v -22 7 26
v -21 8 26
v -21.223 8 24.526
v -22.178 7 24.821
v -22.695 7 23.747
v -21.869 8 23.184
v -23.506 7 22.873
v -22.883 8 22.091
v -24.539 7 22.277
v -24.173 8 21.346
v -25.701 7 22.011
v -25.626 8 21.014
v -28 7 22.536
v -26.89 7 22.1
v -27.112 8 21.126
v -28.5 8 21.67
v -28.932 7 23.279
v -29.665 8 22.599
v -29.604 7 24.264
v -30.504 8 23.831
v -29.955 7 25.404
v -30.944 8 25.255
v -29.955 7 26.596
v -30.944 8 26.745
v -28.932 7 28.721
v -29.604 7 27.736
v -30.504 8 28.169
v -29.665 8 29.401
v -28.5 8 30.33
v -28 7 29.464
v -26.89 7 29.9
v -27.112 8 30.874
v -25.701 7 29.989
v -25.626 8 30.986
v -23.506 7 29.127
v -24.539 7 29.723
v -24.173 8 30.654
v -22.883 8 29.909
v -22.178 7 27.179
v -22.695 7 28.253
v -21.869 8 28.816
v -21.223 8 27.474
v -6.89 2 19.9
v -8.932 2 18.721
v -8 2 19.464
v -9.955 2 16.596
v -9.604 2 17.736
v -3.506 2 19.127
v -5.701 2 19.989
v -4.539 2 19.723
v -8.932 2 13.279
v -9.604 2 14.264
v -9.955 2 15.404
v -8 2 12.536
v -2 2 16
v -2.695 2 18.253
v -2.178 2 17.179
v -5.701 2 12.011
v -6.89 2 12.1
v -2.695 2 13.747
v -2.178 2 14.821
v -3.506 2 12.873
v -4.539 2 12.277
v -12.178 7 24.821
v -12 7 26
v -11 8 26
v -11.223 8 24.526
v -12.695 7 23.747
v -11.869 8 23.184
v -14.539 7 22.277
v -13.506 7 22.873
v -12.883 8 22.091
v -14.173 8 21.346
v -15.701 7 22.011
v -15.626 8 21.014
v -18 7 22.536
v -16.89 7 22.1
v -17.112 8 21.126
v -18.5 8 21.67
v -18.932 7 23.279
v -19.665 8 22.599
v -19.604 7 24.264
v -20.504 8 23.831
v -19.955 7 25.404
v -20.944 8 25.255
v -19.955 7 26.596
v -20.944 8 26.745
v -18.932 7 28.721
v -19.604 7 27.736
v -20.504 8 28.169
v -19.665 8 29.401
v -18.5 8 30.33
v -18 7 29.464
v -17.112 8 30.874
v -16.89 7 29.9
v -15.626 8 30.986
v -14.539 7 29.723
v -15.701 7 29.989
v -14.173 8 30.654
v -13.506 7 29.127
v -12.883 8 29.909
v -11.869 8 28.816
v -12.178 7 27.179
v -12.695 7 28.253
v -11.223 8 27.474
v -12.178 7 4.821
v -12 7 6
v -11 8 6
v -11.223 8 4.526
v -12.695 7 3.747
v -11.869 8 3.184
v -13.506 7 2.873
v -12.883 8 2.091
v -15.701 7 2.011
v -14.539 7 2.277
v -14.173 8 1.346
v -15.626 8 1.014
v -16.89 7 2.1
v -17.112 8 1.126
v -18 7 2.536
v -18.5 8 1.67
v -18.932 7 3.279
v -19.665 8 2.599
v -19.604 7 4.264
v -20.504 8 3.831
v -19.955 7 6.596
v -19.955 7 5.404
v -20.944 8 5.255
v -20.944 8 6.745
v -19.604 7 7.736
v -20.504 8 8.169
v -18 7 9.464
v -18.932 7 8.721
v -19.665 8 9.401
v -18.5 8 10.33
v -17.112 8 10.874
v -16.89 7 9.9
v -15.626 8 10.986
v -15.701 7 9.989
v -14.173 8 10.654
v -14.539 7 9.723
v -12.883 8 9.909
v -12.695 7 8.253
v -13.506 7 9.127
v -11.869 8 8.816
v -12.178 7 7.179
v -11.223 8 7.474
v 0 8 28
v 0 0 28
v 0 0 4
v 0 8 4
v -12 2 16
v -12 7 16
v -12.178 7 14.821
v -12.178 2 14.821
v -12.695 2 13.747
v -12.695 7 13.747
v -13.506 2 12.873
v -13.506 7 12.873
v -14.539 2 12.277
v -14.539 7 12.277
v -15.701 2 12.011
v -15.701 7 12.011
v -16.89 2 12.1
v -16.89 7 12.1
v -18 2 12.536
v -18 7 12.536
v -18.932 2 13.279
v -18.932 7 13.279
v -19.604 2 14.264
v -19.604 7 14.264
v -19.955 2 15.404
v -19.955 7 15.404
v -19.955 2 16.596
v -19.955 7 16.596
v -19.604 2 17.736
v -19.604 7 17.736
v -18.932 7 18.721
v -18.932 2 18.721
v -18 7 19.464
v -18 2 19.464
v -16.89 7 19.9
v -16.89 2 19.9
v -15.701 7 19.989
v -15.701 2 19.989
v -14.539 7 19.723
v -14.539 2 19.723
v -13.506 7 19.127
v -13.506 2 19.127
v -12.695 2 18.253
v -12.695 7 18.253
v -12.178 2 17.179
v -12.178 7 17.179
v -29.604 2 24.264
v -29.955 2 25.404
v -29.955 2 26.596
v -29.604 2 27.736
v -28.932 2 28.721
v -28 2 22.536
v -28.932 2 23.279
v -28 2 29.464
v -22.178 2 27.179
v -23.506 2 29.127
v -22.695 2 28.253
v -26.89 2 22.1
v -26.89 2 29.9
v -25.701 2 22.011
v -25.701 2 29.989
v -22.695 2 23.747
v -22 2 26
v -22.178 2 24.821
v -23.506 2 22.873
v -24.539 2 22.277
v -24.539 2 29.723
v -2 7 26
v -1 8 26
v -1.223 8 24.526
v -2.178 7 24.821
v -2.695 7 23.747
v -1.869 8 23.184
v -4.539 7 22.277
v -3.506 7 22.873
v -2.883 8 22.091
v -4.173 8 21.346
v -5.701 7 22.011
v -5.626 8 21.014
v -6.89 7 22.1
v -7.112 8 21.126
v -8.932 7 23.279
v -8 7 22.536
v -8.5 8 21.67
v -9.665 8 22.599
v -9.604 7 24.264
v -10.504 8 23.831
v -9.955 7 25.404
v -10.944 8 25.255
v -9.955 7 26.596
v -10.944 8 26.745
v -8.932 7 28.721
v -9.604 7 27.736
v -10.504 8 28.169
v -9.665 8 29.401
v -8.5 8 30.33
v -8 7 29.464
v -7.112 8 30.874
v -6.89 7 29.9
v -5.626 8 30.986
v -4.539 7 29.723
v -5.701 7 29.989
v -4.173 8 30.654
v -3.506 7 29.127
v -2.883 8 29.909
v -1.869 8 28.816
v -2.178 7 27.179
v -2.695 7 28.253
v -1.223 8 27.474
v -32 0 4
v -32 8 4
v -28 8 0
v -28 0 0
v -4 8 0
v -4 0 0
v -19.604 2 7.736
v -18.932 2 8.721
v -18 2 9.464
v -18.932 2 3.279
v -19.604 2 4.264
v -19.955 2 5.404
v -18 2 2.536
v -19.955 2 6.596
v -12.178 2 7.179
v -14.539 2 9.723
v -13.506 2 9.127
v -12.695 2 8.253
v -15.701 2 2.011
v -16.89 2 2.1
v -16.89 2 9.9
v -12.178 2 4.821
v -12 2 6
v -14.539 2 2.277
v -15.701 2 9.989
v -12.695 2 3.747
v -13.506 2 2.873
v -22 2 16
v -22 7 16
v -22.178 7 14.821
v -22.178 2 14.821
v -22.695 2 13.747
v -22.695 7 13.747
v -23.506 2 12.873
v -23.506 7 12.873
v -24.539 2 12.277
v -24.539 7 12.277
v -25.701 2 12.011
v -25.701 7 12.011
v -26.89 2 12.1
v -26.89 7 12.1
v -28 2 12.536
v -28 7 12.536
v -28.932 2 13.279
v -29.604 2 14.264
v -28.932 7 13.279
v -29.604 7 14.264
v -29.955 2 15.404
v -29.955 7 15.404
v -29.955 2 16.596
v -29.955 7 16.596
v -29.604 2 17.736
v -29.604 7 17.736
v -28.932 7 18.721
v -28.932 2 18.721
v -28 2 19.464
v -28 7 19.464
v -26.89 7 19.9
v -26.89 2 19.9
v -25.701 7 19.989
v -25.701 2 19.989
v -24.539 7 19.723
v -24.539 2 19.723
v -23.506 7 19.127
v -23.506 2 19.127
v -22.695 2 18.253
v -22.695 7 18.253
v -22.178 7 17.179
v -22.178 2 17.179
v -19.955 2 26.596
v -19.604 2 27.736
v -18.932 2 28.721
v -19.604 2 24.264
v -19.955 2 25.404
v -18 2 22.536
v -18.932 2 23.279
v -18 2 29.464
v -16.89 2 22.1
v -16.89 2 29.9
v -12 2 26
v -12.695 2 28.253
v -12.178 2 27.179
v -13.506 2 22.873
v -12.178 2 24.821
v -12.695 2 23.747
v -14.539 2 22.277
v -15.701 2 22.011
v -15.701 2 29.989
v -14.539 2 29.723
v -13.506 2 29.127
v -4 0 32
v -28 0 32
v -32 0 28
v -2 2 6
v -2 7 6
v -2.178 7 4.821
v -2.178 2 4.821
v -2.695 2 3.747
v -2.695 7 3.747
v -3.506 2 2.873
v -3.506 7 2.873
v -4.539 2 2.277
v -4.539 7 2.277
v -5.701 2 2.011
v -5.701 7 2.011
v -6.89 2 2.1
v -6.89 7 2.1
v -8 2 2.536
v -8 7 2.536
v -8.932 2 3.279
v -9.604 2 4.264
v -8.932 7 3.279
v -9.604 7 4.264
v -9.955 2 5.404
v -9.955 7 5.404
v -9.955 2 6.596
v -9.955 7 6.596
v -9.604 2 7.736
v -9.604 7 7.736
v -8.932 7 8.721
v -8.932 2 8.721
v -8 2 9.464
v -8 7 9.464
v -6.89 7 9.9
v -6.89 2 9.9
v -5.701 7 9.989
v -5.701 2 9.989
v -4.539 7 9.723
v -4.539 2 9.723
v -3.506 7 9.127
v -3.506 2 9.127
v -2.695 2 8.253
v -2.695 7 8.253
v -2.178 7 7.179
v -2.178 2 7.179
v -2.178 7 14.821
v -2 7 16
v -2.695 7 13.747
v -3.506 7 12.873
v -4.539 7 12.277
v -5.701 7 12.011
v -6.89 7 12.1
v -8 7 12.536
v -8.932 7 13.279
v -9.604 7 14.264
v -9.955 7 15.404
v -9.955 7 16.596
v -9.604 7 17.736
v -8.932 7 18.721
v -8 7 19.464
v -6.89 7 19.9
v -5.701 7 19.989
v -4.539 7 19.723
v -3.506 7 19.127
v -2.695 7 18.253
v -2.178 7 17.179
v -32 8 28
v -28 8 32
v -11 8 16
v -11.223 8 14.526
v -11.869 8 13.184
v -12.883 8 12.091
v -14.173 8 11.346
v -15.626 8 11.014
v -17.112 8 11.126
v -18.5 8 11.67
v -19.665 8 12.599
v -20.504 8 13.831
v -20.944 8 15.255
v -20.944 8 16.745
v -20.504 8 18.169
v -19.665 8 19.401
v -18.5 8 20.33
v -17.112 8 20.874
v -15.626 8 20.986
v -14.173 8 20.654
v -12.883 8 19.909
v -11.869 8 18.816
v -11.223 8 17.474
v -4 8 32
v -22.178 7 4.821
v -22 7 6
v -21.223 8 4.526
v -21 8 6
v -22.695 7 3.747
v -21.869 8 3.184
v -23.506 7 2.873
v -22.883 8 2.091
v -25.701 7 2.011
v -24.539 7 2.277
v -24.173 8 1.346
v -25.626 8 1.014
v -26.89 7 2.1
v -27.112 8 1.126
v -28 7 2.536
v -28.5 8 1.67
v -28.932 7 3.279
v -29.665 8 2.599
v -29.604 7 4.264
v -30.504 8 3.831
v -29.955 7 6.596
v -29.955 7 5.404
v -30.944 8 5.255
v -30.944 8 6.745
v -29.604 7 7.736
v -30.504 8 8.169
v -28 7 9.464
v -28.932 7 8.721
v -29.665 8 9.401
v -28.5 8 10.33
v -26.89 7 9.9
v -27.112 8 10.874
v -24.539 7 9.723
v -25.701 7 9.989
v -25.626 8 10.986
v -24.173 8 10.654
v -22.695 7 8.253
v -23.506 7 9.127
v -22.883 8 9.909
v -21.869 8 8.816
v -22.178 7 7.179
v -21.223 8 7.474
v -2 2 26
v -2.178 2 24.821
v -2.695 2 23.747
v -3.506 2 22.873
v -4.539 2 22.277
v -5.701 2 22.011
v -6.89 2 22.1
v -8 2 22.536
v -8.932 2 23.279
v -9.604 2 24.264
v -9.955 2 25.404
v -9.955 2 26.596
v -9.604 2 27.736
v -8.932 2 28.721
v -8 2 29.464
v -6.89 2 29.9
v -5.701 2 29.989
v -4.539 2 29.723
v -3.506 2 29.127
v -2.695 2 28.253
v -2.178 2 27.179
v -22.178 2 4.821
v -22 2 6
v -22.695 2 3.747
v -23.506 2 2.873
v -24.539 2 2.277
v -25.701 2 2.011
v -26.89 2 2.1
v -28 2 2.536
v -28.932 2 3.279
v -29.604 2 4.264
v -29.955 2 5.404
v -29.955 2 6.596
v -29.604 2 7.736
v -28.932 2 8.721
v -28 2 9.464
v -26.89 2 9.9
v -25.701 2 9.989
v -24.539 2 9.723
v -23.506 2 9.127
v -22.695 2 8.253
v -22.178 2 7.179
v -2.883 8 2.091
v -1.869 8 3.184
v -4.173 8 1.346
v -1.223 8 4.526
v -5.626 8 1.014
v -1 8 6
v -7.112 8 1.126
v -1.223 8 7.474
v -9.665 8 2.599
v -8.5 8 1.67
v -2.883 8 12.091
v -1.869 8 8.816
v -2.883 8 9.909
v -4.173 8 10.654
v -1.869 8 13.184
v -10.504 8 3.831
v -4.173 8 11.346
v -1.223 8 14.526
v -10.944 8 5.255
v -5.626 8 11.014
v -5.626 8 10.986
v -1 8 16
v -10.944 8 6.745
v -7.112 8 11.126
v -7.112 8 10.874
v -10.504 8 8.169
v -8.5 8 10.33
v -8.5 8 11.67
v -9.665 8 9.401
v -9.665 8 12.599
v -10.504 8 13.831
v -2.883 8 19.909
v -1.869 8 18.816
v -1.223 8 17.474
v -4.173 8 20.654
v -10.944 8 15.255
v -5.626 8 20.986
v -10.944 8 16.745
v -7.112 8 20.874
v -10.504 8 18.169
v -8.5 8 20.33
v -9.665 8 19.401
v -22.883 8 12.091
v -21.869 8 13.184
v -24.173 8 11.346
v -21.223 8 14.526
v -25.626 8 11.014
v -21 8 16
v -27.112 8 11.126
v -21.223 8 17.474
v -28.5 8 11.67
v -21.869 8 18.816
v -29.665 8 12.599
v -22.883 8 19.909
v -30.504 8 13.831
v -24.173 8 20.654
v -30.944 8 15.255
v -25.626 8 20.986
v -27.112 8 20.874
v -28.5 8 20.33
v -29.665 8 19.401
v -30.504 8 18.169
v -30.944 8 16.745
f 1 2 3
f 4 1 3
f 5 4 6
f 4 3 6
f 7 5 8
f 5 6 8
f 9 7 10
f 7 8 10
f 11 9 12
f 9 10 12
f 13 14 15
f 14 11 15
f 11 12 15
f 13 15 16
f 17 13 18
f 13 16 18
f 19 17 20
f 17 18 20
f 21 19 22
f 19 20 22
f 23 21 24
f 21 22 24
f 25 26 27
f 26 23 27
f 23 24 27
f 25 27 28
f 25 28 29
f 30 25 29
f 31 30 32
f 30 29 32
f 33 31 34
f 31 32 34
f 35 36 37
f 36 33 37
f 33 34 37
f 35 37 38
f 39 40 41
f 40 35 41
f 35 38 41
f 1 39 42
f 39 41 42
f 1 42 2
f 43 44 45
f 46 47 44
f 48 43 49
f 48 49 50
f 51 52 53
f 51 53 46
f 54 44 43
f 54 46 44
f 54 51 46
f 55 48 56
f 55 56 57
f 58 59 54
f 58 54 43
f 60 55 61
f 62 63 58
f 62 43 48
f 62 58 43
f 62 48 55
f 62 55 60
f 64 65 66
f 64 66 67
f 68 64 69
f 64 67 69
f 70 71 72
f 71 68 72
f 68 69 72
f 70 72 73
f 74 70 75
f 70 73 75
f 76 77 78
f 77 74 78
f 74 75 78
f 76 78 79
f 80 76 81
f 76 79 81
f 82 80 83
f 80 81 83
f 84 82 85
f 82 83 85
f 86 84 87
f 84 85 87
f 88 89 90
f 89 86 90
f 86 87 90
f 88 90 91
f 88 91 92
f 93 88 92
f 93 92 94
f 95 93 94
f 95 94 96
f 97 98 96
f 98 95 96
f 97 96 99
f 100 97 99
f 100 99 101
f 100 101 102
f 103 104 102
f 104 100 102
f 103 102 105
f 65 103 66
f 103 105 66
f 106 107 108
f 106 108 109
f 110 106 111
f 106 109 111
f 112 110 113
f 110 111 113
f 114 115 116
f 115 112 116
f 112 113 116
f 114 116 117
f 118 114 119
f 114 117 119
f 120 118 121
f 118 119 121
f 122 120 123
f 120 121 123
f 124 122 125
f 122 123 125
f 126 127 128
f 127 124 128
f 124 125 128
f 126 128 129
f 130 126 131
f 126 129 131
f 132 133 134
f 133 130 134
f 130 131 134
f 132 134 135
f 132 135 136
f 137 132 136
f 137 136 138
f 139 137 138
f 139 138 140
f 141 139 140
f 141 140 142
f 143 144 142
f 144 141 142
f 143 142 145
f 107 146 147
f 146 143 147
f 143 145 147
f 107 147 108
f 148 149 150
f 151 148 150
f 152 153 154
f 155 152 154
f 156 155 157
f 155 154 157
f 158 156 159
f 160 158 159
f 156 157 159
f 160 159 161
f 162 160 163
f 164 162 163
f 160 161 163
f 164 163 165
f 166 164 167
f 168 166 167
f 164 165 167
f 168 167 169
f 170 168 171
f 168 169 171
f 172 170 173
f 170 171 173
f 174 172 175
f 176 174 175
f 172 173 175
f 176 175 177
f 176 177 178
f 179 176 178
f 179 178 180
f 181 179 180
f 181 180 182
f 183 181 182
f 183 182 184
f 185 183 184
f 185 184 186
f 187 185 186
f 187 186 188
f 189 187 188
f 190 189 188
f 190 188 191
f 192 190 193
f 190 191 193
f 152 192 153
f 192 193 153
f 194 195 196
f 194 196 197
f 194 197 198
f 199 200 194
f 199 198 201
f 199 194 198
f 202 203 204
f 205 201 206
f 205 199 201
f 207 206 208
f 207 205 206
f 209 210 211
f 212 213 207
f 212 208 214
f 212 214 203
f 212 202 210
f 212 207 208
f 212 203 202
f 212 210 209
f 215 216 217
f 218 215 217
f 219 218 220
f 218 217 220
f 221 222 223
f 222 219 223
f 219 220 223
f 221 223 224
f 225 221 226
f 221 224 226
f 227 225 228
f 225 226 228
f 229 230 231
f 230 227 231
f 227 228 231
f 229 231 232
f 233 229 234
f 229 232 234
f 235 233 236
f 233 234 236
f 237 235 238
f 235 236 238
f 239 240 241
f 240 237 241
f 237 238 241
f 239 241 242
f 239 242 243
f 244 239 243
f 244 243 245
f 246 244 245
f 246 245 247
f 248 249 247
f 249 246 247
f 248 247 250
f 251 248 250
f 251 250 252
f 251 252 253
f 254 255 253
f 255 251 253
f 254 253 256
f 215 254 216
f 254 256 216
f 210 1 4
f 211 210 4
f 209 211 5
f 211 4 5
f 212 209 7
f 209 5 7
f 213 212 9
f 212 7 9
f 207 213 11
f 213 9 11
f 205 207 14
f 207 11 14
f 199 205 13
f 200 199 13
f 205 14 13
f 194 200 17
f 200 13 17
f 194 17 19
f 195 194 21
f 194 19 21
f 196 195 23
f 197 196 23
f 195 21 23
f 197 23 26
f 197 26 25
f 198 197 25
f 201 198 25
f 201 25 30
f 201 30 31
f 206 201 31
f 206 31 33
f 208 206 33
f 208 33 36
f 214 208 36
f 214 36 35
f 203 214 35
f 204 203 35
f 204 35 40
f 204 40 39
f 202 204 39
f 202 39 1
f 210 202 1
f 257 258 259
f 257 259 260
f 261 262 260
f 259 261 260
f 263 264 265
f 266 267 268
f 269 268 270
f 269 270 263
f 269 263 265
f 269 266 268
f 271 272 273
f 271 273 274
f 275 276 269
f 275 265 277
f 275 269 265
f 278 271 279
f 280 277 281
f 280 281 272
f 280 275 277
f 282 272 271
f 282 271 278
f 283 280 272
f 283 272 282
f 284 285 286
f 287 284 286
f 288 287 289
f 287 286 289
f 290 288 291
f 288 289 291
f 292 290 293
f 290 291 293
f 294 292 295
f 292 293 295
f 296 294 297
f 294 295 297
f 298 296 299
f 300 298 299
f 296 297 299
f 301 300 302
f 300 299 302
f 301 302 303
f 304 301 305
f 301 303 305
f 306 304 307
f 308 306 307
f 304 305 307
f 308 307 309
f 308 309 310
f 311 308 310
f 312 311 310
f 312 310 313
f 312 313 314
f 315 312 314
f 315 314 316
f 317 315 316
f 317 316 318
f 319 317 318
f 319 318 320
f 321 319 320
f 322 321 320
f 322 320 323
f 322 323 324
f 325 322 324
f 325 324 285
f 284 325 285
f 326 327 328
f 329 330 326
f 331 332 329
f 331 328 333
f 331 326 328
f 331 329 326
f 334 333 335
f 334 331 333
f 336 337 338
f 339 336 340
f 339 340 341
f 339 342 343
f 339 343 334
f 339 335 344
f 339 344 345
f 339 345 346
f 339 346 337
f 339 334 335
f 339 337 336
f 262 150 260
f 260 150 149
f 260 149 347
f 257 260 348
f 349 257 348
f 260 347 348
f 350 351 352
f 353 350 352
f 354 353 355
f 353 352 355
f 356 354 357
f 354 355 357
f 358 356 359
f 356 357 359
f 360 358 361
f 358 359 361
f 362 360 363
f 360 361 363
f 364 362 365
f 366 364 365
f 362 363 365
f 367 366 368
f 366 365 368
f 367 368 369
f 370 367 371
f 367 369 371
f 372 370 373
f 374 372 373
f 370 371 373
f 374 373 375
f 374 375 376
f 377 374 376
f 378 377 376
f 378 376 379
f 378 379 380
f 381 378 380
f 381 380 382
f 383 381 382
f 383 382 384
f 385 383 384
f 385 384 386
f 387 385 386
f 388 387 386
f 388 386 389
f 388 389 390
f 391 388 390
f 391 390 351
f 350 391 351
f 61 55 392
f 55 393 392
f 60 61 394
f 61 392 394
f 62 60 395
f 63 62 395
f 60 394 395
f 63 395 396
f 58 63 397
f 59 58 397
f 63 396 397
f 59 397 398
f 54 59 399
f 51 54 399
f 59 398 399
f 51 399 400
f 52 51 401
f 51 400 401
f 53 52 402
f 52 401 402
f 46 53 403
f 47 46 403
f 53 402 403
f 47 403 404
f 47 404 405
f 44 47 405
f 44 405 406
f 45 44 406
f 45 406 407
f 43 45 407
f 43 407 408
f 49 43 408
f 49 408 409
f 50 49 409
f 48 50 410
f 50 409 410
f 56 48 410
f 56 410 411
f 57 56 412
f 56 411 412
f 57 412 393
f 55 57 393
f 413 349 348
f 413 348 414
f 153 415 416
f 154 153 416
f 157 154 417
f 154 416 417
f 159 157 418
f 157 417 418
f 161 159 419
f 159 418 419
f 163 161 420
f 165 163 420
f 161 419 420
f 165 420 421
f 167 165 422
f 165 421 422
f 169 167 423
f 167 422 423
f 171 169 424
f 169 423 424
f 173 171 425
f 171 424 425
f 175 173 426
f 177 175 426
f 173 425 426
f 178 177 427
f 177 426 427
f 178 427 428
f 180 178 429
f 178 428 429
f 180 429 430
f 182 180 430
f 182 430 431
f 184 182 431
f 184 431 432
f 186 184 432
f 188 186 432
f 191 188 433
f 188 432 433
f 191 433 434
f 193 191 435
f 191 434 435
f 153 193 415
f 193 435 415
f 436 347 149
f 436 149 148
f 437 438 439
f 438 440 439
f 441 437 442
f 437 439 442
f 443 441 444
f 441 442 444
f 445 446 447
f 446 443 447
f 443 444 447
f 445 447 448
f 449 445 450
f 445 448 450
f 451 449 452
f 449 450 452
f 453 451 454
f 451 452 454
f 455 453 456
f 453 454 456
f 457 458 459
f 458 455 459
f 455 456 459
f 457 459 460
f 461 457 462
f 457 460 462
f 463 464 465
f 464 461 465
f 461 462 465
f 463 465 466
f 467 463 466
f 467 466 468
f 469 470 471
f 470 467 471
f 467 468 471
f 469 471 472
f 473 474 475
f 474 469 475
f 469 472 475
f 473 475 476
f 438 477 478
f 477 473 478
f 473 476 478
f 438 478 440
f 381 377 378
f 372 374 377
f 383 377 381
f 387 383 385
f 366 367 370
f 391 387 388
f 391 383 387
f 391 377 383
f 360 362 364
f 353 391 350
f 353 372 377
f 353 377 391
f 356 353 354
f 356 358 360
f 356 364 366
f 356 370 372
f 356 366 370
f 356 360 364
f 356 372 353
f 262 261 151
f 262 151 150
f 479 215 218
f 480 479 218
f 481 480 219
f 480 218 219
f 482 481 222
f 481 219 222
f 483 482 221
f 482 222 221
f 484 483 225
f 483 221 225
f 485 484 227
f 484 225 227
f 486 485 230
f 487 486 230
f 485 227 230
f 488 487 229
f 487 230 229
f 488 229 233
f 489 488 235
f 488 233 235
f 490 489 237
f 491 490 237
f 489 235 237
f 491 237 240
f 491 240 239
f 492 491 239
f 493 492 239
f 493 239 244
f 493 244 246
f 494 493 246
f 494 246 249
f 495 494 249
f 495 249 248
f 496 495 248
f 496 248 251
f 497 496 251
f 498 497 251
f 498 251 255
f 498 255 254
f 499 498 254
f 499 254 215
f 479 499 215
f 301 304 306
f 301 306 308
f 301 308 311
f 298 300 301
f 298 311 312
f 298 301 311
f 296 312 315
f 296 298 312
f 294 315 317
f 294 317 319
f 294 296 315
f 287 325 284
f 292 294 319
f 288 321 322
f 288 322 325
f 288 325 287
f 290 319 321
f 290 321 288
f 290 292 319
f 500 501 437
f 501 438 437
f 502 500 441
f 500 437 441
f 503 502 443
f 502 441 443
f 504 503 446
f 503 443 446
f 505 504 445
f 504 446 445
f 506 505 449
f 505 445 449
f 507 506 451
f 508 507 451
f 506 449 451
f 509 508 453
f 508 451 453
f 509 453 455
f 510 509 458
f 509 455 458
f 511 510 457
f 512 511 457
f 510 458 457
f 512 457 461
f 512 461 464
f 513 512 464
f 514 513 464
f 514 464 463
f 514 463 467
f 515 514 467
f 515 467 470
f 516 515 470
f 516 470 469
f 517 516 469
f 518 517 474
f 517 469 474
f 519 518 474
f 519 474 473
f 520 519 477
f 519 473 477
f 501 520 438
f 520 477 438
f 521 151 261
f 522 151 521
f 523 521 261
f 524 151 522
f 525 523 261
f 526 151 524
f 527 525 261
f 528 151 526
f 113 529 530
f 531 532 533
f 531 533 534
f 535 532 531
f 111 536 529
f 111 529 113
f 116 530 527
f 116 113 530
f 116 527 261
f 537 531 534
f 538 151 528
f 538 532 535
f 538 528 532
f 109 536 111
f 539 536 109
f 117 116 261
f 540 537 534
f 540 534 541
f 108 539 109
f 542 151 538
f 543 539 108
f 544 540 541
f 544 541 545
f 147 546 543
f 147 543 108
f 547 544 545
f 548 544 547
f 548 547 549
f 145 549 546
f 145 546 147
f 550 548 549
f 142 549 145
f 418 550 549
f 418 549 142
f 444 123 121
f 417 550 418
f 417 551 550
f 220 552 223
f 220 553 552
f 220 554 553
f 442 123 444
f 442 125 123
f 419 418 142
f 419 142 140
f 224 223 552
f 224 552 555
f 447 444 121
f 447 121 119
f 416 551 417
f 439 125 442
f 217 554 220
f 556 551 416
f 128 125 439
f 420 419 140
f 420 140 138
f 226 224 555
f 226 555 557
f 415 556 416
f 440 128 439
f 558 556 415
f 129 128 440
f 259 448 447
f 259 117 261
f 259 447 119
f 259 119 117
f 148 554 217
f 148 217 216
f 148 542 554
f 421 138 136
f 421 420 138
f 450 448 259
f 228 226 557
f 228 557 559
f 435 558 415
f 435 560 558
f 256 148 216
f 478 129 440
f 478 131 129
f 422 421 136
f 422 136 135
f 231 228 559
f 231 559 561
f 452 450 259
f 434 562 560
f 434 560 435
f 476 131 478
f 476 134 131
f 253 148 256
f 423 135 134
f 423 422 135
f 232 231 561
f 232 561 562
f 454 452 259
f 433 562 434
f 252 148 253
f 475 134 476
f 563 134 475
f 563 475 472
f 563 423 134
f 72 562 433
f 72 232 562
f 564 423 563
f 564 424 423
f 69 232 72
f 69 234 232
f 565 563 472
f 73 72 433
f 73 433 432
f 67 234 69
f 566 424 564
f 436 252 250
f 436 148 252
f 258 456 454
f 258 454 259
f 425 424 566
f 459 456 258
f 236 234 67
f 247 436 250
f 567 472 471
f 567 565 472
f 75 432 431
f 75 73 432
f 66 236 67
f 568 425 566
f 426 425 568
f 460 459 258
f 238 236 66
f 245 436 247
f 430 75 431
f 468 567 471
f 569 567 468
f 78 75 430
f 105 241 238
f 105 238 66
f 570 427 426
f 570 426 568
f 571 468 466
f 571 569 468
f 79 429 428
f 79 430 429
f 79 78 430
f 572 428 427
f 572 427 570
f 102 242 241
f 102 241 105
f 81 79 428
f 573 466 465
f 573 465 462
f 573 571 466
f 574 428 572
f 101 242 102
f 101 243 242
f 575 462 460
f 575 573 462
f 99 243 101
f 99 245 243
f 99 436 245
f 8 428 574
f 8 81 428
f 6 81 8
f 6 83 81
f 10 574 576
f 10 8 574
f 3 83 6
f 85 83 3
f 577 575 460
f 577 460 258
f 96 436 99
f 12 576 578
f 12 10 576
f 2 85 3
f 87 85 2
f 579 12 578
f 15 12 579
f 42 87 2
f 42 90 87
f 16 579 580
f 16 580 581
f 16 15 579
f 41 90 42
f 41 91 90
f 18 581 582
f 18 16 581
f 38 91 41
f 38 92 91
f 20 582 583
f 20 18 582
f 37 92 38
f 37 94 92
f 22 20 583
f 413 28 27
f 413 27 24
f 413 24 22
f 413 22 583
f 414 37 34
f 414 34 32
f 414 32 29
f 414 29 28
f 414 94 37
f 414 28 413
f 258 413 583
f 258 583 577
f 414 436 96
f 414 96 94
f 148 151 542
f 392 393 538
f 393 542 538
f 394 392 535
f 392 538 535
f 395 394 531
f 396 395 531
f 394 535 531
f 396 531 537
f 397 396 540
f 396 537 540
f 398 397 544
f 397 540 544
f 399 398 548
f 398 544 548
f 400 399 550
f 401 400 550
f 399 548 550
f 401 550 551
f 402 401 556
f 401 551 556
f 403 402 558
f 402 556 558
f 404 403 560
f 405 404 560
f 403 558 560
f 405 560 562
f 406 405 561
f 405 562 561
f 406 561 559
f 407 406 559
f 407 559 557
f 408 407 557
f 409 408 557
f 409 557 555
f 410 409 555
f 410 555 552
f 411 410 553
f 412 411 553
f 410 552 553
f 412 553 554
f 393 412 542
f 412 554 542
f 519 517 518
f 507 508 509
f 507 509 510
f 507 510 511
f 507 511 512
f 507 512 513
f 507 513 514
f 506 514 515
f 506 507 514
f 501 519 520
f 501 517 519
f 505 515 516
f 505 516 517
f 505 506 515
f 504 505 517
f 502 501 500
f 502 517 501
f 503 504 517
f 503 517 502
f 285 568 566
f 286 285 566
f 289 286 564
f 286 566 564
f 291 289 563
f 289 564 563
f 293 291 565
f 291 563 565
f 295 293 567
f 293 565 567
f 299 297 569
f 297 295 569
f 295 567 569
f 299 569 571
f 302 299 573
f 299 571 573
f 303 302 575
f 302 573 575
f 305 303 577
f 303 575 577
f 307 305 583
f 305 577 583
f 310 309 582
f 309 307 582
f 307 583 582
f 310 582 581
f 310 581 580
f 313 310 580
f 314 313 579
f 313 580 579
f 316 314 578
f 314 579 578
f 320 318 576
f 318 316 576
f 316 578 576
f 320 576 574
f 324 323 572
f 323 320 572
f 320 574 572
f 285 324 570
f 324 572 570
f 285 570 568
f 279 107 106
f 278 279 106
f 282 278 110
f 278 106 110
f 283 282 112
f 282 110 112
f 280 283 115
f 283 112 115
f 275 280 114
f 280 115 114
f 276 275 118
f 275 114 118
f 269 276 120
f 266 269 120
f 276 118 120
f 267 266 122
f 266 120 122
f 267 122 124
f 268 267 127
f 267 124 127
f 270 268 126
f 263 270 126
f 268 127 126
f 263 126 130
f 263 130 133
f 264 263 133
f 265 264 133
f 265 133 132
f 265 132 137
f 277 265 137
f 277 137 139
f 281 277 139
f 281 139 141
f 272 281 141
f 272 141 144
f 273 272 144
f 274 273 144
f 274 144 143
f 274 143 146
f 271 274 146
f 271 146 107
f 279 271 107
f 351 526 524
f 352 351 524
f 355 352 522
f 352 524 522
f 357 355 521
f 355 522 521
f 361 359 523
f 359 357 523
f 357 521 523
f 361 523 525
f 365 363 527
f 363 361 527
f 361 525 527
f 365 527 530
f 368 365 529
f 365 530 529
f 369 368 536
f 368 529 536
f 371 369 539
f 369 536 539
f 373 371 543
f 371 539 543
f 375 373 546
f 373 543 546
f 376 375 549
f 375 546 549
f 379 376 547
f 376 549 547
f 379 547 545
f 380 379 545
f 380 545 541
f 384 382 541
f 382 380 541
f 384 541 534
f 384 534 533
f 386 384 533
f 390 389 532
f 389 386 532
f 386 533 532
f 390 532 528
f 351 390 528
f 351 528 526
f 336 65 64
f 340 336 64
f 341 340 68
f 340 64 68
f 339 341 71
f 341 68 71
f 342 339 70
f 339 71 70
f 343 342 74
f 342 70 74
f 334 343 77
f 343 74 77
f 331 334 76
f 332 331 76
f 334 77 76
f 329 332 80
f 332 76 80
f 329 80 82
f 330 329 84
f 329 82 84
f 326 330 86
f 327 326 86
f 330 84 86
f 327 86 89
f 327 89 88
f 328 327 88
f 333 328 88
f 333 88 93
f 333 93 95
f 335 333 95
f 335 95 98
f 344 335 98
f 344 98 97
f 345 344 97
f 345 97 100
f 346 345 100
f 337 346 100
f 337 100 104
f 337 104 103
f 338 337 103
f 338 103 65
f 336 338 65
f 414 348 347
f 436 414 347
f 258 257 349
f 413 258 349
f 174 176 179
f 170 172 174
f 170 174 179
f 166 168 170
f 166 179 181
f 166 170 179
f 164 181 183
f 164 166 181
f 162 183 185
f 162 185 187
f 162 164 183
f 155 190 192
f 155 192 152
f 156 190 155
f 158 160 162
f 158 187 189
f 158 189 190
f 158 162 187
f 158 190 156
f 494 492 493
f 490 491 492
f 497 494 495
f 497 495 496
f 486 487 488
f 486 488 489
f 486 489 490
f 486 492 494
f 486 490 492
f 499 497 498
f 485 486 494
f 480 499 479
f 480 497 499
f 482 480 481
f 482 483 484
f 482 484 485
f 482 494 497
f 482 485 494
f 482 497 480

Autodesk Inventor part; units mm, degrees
ref_plane "YZ Plane" through (0, 0, 0) normal (1, 0, 0) x (0, 1, 0)
ref_plane "XZ Plane" through (0, 0, 0) normal (0, 1, 0) x (-1, 0, 0)
ref_plane "XY Plane" through (0, 0, 0) normal (0, 0, 1) x (1, 0, 0)
sketch "Esquisse1" plane through (0, 0, 0) normal (0, 1, 0) x (-1, 0, 0)
  line L0 (0, 0) -> (32, 0)
  line L1 (32, 0) -> (32, 32)
  line L2 (32, 32) -> (0, 32)
  line L3 (0, 32) -> (0, 0)
  dimension "d0" = 32
  dimension "d1" = 32
extrude "Extrusion1" add sketch "Esquisse1" along normal blind 8
sketch "Esquisse2" plane through (0, 8, 0) normal (0, 1, 0) x (1, 0, 0)
  line L0 (-32, 0) -> (-32, -32) projected
  line L1 (-32, -30) -> (12, -30)
  line L2 (-32, -2) -> (0.5255, -2)
  line L3 (-30, -30) -> (-30, -2)
  line L4 (-2, -30) -> (-2, -2)
  line L5 (0, -32) -> (0, 0) projected
  line L6 (-32, -32) -> (0, -32) projected
  line L7 (0, 0) -> (-32, 0) projected
  circle A0 centre (-26, -26) radius 4
  circle A1 centre (-26, -16) radius 4
  circle A2 centre (-26, -6) radius 4
  circle A3 centre (-16, -26) radius 4
  circle A4 centre (-16, -16) radius 4
  circle A5 centre (-16, -6) radius 4
  circle A6 centre (-6, -26) radius 4
  circle A7 centre (-6, -16) radius 4
  circle A8 centre (-6, -6) radius 4
  dimension "d4" = 2
  dimension "d5" = 2
  dimension "d6" = 2
  dimension "d7" = 2
  dimension "d18" = 8
  dimension "d19" = 8
  dimension "d20" = 8
  dimension "d21" = 8
  dimension "d22" = 8
  dimension "d23" = 8
  dimension "d24" = 8
  dimension "d25" = 8
  dimension "d26" = 8
  dimension "d27" = 4
  dimension "d28" = 4
  dimension "d29" = 4
  dimension "d30" = 4
  dimension "d31" = 4
  dimension "d32" = 4
  dimension "d33" = 4
  dimension "d34" = 4
  dimension "d35" = 10
  dimension "d36" = 4
  dimension "d37" = 4
  dimension "d38" = 4
  dimension "d39" = 10
  dimension "d40" = 10
  dimension "d41" = 10
  dimension "d42" = 10
  dimension "d43" = 10
  dimension "d44" = 10
  dimension "d45" = 10
extrude "Extrusion2" cut sketch "Esquisse2" against normal blind 6 contours A1 | A3 | A7 | A5 | A2 | A0 | A8 | A6 | A4
chamfer "Chanfrein1" distance 4 angle 45 4 edges at (0, 4, 32) (0, 4, 0) (-32, 4, 0) (-32, 4, 32)
chamfer "Chanfrein2" distance 1 angle 45 9 edges at (-30, 8, 26) (-30, 8, 16) (-30, 8, 6) (-20, 8, 6) (-20, 8, 16) (-20, 8, 26) (-10, 8, 16) (-10, 8, 26) (-10, 8, 6)
properties part number "Plateau"
